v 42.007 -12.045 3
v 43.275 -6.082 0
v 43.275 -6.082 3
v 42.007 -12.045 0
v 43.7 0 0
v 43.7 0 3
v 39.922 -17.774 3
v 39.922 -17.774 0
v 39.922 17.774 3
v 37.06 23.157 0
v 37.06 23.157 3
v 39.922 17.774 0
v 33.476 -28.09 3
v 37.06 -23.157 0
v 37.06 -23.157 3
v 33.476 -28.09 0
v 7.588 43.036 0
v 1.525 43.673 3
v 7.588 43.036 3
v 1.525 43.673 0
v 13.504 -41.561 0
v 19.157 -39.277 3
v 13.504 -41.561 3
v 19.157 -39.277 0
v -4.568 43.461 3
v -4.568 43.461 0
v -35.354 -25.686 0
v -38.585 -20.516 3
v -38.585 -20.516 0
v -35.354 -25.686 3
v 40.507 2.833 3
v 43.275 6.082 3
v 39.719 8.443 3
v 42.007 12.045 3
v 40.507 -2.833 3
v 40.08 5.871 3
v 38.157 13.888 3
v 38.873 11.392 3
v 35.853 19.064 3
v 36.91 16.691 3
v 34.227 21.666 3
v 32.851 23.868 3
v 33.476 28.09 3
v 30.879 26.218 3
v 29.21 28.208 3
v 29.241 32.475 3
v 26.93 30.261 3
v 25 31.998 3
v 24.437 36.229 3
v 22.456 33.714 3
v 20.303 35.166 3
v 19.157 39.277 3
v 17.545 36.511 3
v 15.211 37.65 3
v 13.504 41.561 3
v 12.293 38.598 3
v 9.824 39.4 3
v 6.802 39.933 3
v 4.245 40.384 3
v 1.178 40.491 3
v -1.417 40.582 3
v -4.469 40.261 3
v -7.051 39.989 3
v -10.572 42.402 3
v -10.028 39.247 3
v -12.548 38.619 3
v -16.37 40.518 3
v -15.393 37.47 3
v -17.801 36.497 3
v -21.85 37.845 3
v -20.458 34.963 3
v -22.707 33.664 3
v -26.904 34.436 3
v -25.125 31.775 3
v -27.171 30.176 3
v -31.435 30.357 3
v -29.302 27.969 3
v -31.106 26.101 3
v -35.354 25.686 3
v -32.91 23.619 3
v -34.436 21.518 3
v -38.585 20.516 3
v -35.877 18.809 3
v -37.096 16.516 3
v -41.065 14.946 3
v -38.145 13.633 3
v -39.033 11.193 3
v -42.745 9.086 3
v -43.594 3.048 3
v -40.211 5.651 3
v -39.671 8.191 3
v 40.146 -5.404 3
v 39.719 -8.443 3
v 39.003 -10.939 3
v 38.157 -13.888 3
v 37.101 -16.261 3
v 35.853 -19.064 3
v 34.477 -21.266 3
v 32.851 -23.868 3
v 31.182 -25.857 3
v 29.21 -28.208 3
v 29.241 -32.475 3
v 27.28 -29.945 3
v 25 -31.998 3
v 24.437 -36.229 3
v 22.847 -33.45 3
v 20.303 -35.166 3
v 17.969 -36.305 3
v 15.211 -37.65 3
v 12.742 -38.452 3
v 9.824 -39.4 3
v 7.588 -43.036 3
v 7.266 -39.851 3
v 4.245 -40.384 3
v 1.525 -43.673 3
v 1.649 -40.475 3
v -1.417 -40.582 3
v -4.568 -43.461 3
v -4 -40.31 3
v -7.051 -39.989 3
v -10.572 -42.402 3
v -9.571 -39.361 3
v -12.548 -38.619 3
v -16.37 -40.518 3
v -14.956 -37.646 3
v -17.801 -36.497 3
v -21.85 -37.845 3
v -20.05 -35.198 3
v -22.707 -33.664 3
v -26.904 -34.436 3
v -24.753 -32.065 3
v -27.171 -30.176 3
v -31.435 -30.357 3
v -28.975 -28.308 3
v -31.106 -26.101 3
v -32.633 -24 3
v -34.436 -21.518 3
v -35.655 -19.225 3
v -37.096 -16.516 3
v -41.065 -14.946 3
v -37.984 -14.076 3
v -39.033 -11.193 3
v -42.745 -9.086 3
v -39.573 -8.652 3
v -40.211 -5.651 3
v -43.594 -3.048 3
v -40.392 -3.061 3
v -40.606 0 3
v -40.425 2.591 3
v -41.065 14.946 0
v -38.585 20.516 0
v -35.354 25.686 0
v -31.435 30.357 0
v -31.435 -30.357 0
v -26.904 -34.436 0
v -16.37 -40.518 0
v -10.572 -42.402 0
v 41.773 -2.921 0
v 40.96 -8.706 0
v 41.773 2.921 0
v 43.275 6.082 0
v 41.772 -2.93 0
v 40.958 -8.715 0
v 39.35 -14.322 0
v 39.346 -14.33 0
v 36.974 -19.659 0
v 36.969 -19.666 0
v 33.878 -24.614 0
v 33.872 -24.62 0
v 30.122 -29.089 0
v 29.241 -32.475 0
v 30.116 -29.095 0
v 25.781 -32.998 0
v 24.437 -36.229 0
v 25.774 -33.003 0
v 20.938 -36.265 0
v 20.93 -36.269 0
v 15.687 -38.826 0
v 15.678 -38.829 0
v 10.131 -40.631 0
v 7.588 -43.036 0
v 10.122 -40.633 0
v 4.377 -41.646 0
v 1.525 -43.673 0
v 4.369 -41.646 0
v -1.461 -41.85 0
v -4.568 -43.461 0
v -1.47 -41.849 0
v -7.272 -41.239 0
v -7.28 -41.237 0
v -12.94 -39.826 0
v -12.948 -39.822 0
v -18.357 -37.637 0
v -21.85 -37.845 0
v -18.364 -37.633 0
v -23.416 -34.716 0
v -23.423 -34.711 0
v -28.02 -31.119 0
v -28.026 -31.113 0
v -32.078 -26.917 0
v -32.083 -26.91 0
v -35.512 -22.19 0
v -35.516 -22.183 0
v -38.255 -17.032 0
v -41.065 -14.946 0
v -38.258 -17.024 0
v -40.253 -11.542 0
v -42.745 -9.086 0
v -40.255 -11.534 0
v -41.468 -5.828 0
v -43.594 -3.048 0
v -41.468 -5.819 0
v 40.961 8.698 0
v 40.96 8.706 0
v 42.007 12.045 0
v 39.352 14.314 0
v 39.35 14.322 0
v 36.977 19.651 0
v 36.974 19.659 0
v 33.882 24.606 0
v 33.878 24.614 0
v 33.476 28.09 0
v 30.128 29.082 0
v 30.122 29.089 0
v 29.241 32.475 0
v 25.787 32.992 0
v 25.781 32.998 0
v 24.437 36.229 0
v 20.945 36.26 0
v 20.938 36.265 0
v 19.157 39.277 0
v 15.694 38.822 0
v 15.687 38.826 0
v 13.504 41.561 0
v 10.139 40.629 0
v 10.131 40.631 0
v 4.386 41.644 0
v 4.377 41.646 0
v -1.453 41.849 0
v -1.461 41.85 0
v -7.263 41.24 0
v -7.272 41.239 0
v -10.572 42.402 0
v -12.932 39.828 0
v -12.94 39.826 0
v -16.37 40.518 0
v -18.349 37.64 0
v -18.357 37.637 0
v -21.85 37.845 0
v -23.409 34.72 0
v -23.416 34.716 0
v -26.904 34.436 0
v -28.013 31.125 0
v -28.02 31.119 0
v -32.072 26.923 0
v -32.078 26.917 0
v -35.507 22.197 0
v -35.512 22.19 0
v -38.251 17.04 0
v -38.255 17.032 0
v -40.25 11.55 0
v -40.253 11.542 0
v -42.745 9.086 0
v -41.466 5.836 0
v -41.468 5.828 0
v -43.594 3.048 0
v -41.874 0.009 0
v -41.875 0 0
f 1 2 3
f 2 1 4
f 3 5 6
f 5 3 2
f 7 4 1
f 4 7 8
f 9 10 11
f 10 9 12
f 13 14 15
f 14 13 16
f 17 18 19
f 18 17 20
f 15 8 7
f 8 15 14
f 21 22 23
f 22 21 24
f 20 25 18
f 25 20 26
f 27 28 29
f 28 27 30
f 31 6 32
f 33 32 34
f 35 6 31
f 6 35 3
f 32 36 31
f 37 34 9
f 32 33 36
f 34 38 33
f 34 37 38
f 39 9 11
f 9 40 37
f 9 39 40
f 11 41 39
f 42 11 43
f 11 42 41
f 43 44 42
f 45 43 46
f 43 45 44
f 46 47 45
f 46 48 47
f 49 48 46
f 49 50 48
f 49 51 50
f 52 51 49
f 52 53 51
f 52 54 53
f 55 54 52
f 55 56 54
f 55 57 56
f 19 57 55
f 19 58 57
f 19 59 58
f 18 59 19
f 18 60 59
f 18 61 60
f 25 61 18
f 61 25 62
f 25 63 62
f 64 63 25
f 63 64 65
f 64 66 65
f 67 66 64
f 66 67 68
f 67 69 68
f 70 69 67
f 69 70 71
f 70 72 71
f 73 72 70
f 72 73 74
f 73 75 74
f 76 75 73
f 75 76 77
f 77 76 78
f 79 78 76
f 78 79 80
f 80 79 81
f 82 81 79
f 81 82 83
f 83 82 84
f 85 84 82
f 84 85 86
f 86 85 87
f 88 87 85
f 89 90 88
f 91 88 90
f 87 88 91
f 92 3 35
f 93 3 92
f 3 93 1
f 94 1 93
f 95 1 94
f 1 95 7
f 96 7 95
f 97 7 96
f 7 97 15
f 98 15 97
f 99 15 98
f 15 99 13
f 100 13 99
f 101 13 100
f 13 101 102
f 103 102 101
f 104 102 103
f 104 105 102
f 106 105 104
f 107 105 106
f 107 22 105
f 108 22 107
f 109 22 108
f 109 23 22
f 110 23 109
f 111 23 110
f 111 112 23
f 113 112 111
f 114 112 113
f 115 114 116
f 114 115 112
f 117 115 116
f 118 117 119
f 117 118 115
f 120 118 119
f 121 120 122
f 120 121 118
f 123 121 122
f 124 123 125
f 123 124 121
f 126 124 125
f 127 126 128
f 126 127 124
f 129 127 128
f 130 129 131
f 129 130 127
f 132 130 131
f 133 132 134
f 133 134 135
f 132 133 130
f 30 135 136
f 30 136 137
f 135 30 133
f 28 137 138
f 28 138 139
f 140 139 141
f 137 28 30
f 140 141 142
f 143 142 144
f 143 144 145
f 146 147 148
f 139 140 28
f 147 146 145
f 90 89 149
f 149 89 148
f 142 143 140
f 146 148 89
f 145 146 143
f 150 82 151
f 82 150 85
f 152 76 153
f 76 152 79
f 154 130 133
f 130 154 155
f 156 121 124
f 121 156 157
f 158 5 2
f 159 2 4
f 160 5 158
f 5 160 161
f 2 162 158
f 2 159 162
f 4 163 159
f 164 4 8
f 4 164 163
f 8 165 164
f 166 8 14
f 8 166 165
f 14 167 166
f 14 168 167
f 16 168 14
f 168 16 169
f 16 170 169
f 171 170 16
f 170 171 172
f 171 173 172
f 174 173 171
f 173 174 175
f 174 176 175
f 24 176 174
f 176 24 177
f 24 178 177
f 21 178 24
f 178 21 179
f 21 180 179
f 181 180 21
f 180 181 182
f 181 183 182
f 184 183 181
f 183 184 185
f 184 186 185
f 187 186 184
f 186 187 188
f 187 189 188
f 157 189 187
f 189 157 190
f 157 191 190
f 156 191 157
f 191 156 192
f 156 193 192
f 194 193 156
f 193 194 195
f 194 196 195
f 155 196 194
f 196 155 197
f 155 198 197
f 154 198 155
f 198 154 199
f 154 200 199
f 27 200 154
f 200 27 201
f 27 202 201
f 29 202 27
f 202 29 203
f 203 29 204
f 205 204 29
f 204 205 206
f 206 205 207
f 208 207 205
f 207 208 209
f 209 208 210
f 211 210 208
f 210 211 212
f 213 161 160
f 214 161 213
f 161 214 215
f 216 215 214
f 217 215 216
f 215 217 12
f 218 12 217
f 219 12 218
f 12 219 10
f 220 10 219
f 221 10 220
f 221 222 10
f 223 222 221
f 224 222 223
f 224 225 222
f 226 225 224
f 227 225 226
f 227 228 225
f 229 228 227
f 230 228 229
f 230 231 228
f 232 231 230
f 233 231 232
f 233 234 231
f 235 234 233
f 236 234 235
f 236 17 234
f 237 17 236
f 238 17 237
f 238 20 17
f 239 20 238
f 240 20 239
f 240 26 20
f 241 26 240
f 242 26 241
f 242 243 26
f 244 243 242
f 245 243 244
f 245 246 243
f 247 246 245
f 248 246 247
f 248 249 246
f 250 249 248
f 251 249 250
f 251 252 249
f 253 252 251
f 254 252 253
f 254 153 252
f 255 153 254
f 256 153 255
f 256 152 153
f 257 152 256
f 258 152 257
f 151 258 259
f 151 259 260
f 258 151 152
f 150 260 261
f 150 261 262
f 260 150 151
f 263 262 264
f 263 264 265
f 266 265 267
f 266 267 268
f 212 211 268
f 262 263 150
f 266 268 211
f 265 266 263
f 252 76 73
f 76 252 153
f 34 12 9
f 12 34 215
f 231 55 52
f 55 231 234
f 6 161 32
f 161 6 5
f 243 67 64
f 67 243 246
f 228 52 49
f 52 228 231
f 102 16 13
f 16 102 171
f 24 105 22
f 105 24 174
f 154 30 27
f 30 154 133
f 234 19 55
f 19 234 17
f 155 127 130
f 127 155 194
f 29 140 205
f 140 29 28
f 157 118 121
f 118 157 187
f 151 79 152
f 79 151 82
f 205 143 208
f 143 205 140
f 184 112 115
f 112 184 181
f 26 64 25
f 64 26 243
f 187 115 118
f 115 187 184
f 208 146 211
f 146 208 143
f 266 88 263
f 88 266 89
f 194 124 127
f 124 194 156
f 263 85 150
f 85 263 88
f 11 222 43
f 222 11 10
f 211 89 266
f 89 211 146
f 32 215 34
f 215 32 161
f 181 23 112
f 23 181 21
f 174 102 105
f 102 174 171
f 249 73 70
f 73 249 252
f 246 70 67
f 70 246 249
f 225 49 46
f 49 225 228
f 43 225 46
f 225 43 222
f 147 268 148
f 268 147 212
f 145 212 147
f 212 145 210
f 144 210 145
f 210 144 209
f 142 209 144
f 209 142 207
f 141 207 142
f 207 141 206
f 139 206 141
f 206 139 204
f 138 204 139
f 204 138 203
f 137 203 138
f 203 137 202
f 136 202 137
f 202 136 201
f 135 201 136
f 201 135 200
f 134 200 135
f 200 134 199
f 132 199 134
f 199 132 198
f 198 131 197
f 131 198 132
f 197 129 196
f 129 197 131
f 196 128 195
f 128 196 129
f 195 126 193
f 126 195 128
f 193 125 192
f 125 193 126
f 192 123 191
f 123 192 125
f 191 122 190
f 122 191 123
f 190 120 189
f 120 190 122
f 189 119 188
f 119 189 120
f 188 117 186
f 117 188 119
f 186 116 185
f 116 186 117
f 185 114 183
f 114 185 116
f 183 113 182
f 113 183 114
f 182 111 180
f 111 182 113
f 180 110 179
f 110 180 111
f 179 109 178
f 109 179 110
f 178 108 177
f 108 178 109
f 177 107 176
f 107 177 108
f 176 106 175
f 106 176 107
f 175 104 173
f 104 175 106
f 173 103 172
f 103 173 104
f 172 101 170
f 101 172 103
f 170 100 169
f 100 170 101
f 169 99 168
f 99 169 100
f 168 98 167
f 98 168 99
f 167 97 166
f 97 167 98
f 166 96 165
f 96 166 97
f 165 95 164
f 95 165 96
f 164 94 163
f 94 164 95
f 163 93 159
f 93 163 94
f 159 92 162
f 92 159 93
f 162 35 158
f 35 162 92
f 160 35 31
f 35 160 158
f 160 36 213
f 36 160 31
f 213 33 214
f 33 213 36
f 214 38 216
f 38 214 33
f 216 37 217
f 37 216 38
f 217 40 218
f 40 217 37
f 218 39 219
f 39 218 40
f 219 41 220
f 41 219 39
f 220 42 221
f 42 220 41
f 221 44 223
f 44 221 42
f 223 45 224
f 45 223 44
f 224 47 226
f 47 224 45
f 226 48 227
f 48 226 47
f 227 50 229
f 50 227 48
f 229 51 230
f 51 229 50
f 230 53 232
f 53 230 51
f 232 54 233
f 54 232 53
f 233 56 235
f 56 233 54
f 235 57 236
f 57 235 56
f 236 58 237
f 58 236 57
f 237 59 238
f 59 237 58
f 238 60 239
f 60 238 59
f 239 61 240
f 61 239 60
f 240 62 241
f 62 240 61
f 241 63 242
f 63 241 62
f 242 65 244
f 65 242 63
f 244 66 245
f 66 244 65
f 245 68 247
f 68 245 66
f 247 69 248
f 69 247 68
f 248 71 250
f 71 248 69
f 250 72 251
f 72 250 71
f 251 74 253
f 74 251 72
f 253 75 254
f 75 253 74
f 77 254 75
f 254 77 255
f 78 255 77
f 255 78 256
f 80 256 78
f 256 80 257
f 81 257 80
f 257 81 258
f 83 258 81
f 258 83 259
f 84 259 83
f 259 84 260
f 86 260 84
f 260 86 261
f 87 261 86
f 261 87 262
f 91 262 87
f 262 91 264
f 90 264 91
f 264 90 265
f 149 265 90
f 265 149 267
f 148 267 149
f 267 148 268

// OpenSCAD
// Choose Solar Burner Tube or its lid
print_object=1;  // [1:Solar Burner Tube,2:Lid]

// The height of the reflector. I propose a ratio height/focus_area of 2.215 
height=40; // [10:200]

// The focus point is at the smaller aperture. This defines the radius of it.
focus_area=18; //[1:80]

// The resolution of the reflector.
resolution= 45; //[45,80,120]

// Horizontal wall thickness. Set to 0 for a solid body. Try to find a good value for your nozzle size.
wall=1.7; 

// The height of the lid ring. Set to 0 for no lid friction ring.
lid=3; // [0:10]

// The clearence for printing the lid ring and its friction.
clr=0.2; 


//////////////////////////////////////////////////////////////////////////////////////////////
// Solar Burner Tube
// 
// Copyright (C) 2013  Lochner, Juergen
// http://www.thingiverse.com/Ablapo/designs
//
// Warning: It is not recommanded to build this thing out of mirroring materials!
// It could cause fire and eye damage. Sun glases will not protect your eyes.
// Think of it as a big magnifying lens, laser beam and lighter when using it. 
// Remove the reflecting surface for a save storage.
//
// This program is distributed in the hope that it will be useful,
// but WITHOUT ANY WARRANTY; without even the implied warranty of
// MERCHANTABILITY or FITNESS FOR A PARTICULAR PURPOSE. 
//
// This program is free software. It is 
// licensed under the Attribution - Creative Commons license.
// http://creativecommons.org/licenses/by/3.0/
//////////////////////////////////////////////////////////////////////////////////////////////

module paraboloid (y=50, f=10, rfa=0, fc=1, detail=44){
	// y = height of paraboloid
	// f = focus distance 
	// fc : 1 = center paraboloid in focus point(x=0, y=f); 0 = center paraboloid on top (x=0, y=0)
	// rfa = radius of the focus area : 0 = point focus
	// detail = $fn of cone

	hi = (y+2*f)/sqrt(2);								// height and radius of the cone -> alpha = 45° -> sin(45°)=1/sqrt(2)
	x =2*f*sqrt(y/f);									// x  = half size of parabola
	
   translate([0,0,-f*fc])								// center on focus 
	rotate_extrude(convexity = 10,$fn=detail )		// extrude paraboild
	translate([rfa,0,0])								// translate for fokus area	 
	difference(){
		union(){											// adding square for focal area
			projection(cut = true)																			// reduce from 3D cone to 2D parabola
				translate([0,0,f*2]) rotate([45,0,0])													// rotate cone 45° and translate for cutting
				translate([0,0,-hi/2])cylinder(h= hi, r1=hi, r2=0, center=true, $fn=detail);   	// center cone on tip
			translate([-(rfa+x ),0]) square ([rfa+x , y ]);											// focal area square
		}
		translate([-(2*rfa+x ), -1/2]) square ([rfa+x ,y +1] ); 					// cut of half at rotation center 
	}
}

module reflector(hr=40, xr=20, details=80){
	// for optimum covered area:    hr/xr = 2.215  -> hr = 2x distance(from focus to parabola slope of 45°)  
	fr= xr/2;  						// xr= 2*f*sqrt(f/f)
	yr=hr+fr;
	
	translate([0,0,hr])rotate([180,0,0])	
	difference(){
		if (wall>0) {
			paraboloid (yr ,fr , wall , 1,details );
			if (lid>0) {
				translate([0,0, hr-lid/2])cylinder(h=lid,r=wall+2*sqrt(yr*yr-yr*hr),center=true,$fn=details);
				}
			}
		translate([0,0, -0.01])paraboloid (yr+0.02 ,fr , 0, 1,details );
		translate([0,0,-(fr+1)/2])cube([xr*2+wall*4+1,xr*2+wall*4+1,fr+1],center=true);
	}
}


module  print_lit(hr=40, xr=20, details=80){

	fr= xr/2;  						// xr= 2*f*sqrt(f/f)
	yr=hr+fr;
	
	if (wall>0) {
			if (lid>0) {
				difference(){
					translate([0,0,0])cylinder(h=lid+2+wall,r=wall+2*sqrt(yr*yr-yr*hr)+wall+clr,center=true,$fn=details);
					translate([0,0,wall])cylinder(h=lid+2+wall,r=wall+2*sqrt(yr*yr-yr*hr) +clr,center=true,$fn=details);
				}
			}
	}
}

if (print_object==2) print_lit(height,focus_area,resolution);
if (print_object==1) reflector(height,focus_area,resolution);
